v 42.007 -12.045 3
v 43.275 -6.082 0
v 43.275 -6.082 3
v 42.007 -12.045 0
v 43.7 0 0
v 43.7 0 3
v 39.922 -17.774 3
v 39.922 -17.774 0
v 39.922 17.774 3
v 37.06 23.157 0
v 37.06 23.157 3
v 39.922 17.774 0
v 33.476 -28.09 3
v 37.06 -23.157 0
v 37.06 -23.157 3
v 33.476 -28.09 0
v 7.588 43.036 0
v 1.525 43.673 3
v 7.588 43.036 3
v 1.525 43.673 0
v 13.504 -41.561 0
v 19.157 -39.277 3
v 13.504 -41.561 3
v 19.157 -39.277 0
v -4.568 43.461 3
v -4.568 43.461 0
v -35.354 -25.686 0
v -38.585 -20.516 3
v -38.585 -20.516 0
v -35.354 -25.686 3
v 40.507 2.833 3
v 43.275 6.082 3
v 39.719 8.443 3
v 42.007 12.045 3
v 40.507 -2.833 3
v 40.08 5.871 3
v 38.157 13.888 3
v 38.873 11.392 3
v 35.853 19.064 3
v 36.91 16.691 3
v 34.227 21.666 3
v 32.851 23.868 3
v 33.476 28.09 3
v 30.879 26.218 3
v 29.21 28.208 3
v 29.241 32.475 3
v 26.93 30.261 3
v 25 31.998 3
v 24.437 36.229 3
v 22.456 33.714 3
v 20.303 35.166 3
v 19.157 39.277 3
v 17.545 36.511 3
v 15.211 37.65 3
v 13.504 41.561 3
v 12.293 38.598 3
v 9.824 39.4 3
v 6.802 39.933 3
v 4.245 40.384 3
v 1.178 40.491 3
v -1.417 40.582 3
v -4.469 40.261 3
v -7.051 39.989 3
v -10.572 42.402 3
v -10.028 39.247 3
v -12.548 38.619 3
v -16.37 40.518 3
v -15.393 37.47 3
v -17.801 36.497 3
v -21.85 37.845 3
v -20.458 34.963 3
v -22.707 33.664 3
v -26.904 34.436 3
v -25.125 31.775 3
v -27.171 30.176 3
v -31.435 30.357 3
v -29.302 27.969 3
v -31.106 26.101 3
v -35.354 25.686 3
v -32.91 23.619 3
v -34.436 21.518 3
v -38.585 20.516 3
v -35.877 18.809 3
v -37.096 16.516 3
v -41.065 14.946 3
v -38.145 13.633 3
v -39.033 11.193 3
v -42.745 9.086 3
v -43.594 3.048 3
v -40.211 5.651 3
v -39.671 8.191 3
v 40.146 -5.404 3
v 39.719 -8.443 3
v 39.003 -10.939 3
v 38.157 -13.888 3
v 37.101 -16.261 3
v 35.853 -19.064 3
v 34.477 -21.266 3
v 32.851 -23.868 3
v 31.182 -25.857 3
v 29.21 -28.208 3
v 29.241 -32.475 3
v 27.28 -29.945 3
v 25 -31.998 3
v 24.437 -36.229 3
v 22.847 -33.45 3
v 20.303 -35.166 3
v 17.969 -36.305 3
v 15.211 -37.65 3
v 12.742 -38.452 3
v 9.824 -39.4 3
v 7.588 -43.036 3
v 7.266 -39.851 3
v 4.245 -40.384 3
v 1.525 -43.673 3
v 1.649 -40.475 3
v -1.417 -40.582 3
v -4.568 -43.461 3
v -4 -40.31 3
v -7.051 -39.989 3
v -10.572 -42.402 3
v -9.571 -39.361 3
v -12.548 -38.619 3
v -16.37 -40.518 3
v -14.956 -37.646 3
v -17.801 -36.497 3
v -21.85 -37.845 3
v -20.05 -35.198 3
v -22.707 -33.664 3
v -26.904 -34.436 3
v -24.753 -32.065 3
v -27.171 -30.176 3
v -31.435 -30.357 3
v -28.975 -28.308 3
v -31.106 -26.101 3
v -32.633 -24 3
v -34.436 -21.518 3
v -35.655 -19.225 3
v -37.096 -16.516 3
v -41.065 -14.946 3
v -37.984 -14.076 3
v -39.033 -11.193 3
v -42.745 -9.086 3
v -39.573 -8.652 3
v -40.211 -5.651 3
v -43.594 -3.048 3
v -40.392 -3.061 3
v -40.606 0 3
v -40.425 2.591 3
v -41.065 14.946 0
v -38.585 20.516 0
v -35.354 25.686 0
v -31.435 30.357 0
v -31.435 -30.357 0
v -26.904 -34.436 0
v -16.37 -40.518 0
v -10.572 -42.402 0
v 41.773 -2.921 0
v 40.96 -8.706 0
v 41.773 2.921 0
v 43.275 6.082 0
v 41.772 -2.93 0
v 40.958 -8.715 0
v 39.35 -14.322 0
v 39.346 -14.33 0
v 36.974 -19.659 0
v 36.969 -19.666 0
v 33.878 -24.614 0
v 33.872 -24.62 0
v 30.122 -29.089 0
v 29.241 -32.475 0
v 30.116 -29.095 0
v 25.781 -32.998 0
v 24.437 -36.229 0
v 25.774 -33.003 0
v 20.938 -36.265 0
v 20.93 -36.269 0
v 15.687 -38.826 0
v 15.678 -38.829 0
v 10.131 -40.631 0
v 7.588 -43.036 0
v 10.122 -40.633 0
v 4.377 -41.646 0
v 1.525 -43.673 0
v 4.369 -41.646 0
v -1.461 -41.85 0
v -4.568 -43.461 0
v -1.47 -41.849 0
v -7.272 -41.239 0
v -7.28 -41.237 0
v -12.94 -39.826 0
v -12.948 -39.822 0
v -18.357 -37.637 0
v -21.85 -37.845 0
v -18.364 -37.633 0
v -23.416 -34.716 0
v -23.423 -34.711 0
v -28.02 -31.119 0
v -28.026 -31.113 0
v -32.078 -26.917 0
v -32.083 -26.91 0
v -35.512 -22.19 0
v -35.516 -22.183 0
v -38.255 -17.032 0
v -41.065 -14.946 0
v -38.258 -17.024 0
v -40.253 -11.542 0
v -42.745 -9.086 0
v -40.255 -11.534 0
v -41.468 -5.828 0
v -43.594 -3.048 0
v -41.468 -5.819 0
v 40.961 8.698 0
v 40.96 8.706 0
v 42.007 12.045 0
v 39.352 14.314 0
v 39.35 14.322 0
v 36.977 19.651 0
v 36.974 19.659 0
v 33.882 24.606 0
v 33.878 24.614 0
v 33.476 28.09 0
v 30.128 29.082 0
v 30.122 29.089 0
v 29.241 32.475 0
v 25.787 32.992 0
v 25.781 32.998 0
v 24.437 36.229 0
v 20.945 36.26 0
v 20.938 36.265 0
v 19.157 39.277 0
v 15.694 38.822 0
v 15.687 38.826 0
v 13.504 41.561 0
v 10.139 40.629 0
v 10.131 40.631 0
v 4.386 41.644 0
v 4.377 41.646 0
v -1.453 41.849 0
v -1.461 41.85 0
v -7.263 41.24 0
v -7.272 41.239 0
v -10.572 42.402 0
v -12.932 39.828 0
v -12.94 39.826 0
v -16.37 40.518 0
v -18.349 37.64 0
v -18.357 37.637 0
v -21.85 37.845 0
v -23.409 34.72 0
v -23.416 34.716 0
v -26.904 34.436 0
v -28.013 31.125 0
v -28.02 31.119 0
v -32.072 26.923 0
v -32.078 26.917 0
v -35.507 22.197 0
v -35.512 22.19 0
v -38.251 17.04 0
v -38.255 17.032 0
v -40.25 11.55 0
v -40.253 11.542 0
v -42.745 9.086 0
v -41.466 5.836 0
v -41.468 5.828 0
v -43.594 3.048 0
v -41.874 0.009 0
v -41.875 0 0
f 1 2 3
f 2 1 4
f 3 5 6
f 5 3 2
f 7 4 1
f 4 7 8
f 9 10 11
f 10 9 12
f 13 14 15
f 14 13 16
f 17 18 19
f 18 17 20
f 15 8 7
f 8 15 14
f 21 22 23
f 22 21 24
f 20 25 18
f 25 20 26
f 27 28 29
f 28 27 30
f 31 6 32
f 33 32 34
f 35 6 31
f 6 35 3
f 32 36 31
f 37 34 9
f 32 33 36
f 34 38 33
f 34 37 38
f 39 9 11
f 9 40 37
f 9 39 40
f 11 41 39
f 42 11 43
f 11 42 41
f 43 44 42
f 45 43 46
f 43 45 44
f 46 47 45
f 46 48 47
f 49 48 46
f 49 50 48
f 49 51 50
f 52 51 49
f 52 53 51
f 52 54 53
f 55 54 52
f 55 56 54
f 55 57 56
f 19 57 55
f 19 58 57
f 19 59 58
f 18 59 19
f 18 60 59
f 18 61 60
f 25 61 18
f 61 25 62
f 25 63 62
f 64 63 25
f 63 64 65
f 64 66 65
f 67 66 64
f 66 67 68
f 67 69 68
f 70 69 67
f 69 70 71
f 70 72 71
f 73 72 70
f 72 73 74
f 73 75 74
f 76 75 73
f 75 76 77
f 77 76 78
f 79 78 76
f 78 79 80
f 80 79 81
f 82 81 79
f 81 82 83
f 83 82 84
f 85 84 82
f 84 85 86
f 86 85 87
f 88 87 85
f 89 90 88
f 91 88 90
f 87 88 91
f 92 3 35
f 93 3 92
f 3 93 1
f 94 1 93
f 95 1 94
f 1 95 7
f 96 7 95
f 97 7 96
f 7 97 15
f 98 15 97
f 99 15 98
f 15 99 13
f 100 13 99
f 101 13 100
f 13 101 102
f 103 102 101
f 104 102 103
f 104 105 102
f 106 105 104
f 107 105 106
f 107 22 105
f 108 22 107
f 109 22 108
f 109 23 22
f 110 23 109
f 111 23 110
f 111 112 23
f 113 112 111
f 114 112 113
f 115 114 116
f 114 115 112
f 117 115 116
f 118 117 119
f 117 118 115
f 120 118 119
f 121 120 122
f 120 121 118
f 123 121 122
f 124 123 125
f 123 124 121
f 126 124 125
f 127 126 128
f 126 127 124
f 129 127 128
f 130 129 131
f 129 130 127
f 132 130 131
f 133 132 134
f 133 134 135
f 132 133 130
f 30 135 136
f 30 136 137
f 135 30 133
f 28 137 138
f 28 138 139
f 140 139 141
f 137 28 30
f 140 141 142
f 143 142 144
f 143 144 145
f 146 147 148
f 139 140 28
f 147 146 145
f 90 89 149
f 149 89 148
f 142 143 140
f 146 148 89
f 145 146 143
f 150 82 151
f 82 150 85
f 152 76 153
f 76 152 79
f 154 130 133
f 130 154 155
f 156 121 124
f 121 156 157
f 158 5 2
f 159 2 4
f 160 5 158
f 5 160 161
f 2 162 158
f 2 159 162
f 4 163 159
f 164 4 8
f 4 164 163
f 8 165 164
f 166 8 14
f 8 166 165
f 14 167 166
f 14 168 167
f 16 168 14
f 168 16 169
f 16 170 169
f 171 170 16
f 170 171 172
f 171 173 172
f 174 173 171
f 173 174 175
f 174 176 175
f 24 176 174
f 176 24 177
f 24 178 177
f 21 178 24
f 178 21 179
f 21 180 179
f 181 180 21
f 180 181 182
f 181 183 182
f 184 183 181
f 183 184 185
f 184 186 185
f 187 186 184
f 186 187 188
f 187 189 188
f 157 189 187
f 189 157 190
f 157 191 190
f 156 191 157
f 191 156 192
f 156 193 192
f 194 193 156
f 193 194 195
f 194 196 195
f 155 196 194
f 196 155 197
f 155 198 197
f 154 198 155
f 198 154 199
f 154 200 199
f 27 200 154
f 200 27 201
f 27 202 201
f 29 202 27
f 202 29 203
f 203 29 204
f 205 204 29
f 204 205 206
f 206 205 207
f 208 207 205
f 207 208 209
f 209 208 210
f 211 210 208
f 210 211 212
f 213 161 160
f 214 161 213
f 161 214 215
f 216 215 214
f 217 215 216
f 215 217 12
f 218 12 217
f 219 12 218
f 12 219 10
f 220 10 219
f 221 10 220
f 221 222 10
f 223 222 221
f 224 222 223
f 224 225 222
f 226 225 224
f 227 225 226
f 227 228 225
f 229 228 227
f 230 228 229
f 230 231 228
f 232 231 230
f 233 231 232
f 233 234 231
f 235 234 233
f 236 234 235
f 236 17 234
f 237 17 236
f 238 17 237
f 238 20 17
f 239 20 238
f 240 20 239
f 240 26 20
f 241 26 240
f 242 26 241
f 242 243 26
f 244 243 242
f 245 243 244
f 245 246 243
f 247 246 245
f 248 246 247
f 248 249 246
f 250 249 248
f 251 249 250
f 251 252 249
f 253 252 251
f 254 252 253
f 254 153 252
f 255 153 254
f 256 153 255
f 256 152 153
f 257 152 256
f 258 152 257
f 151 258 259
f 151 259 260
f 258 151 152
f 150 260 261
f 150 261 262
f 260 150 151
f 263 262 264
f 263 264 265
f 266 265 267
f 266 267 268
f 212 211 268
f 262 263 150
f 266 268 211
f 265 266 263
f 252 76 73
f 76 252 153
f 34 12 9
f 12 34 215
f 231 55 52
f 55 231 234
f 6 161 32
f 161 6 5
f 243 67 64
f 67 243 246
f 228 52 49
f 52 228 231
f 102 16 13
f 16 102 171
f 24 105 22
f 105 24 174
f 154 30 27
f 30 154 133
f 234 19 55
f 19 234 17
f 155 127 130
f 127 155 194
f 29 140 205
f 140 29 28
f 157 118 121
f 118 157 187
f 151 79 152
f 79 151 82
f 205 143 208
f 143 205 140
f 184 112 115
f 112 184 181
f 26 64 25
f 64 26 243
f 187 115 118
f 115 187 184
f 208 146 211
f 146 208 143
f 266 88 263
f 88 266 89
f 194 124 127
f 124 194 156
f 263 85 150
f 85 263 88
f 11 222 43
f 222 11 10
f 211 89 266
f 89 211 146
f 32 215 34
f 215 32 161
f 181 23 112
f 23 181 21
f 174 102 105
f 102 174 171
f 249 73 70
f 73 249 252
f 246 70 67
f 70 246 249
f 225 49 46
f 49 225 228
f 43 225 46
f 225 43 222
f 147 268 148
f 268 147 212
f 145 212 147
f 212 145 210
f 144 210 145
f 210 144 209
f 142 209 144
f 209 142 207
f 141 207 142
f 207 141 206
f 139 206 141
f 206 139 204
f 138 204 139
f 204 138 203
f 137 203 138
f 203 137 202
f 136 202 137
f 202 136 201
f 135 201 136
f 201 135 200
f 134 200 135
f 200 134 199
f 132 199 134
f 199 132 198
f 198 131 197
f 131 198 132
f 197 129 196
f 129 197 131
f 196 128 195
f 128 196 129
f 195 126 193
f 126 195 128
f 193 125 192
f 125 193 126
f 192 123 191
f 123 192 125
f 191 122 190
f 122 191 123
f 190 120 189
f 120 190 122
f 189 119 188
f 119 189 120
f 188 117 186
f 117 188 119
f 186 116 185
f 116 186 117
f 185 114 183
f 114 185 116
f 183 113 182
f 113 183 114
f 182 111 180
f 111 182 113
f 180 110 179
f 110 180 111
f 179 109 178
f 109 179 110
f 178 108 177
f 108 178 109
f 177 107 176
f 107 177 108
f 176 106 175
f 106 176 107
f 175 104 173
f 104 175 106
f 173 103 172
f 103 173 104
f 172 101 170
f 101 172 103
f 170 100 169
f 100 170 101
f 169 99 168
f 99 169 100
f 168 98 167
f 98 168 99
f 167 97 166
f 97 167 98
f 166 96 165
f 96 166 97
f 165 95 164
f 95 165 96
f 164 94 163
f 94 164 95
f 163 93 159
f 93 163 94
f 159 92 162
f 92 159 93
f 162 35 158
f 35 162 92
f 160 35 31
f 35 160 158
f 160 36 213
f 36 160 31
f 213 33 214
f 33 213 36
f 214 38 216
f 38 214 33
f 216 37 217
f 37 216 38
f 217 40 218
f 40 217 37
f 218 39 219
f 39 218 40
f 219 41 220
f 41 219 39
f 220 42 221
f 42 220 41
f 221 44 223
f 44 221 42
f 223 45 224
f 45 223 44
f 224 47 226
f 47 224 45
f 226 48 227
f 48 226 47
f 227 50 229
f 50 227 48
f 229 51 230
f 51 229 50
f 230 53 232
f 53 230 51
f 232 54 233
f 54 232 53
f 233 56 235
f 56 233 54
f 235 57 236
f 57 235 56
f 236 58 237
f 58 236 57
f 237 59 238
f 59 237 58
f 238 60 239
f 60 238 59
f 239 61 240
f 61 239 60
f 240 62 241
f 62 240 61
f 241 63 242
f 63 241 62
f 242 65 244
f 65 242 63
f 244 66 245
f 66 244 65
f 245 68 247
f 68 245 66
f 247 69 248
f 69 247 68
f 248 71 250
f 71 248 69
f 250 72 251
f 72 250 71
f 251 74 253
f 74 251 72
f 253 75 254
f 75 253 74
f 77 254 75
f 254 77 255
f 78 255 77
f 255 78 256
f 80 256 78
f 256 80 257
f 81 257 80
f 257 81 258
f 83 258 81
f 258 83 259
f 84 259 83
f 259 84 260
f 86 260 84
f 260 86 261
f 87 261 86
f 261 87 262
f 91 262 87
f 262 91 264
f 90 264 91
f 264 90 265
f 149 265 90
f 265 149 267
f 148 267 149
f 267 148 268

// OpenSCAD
// Choose Solar Burner Tube or its lid
print_object=1;  // [1:Solar Burner Tube,2:Lid]

// The height of the reflector. I propose a ratio height/focus_area of 2.215 
height=40; // [10:200]

// The focus point is at the smaller aperture. This defines the radius of it.
focus_area=18; //[1:80]

// The resolution of the reflector.
resolution= 45; //[45,80,120]

// Horizontal wall thickness. Set to 0 for a solid body. Try to find a good value for your nozzle size.
wall=1.7; 

// The height of the lid ring. Set to 0 for no lid friction ring.
lid=3; // [0:10]

// The clearence for printing the lid ring and its friction.
clr=0.2; 


//////////////////////////////////////////////////////////////////////////////////////////////
// Solar Burner Tube
// 
// Copyright (C) 2013  Lochner, Juergen
// http://www.thingiverse.com/Ablapo/designs
//
// Warning: It is not recommanded to build this thing out of mirroring materials!
// It could cause fire and eye damage. Sun glases will not protect your eyes.
// Think of it as a big magnifying lens, laser beam and lighter when using it. 
// Remove the reflecting surface for a save storage.
//
// This program is distributed in the hope that it will be useful,
// but WITHOUT ANY WARRANTY; without even the implied warranty of
// MERCHANTABILITY or FITNESS FOR A PARTICULAR PURPOSE. 
//
// This program is free software. It is 
// licensed under the Attribution - Creative Commons license.
// http://creativecommons.org/licenses/by/3.0/
//////////////////////////////////////////////////////////////////////////////////////////////

module paraboloid (y=50, f=10, rfa=0, fc=1, detail=44){
	// y = height of paraboloid
	// f = focus distance 
	// fc : 1 = center paraboloid in focus point(x=0, y=f); 0 = center paraboloid on top (x=0, y=0)
	// rfa = radius of the focus area : 0 = point focus
	// detail = $fn of cone

	hi = (y+2*f)/sqrt(2);								// height and radius of the cone -> alpha = 45° -> sin(45°)=1/sqrt(2)
	x =2*f*sqrt(y/f);									// x  = half size of parabola
	
   translate([0,0,-f*fc])								// center on focus 
	rotate_extrude(convexity = 10,$fn=detail )		// extrude paraboild
	translate([rfa,0,0])								// translate for fokus area	 
	difference(){
		union(){											// adding square for focal area
			projection(cut = true)																			// reduce from 3D cone to 2D parabola
				translate([0,0,f*2]) rotate([45,0,0])													// rotate cone 45° and translate for cutting
				translate([0,0,-hi/2])cylinder(h= hi, r1=hi, r2=0, center=true, $fn=detail);   	// center cone on tip
			translate([-(rfa+x ),0]) square ([rfa+x , y ]);											// focal area square
		}
		translate([-(2*rfa+x ), -1/2]) square ([rfa+x ,y +1] ); 					// cut of half at rotation center 
	}
}

module reflector(hr=40, xr=20, details=80){
	// for optimum covered area:    hr/xr = 2.215  -> hr = 2x distance(from focus to parabola slope of 45°)  
	fr= xr/2;  						// xr= 2*f*sqrt(f/f)
	yr=hr+fr;
	
	translate([0,0,hr])rotate([180,0,0])	
	difference(){
		if (wall>0) {
			paraboloid (yr ,fr , wall , 1,details );
			if (lid>0) {
				translate([0,0, hr-lid/2])cylinder(h=lid,r=wall+2*sqrt(yr*yr-yr*hr),center=true,$fn=details);
				}
			}
		translate([0,0, -0.01])paraboloid (yr+0.02 ,fr , 0, 1,details );
		translate([0,0,-(fr+1)/2])cube([xr*2+wall*4+1,xr*2+wall*4+1,fr+1],center=true);
	}
}


module  print_lit(hr=40, xr=20, details=80){

	fr= xr/2;  						// xr= 2*f*sqrt(f/f)
	yr=hr+fr;
	
	if (wall>0) {
			if (lid>0) {
				difference(){
					translate([0,0,0])cylinder(h=lid+2+wall,r=wall+2*sqrt(yr*yr-yr*hr)+wall+clr,center=true,$fn=details);
					translate([0,0,wall])cylinder(h=lid+2+wall,r=wall+2*sqrt(yr*yr-yr*hr) +clr,center=true,$fn=details);
				}
			}
	}
}

if (print_object==2) print_lit(height,focus_area,resolution);
if (print_object==1) reflector(height,focus_area,resolution);
